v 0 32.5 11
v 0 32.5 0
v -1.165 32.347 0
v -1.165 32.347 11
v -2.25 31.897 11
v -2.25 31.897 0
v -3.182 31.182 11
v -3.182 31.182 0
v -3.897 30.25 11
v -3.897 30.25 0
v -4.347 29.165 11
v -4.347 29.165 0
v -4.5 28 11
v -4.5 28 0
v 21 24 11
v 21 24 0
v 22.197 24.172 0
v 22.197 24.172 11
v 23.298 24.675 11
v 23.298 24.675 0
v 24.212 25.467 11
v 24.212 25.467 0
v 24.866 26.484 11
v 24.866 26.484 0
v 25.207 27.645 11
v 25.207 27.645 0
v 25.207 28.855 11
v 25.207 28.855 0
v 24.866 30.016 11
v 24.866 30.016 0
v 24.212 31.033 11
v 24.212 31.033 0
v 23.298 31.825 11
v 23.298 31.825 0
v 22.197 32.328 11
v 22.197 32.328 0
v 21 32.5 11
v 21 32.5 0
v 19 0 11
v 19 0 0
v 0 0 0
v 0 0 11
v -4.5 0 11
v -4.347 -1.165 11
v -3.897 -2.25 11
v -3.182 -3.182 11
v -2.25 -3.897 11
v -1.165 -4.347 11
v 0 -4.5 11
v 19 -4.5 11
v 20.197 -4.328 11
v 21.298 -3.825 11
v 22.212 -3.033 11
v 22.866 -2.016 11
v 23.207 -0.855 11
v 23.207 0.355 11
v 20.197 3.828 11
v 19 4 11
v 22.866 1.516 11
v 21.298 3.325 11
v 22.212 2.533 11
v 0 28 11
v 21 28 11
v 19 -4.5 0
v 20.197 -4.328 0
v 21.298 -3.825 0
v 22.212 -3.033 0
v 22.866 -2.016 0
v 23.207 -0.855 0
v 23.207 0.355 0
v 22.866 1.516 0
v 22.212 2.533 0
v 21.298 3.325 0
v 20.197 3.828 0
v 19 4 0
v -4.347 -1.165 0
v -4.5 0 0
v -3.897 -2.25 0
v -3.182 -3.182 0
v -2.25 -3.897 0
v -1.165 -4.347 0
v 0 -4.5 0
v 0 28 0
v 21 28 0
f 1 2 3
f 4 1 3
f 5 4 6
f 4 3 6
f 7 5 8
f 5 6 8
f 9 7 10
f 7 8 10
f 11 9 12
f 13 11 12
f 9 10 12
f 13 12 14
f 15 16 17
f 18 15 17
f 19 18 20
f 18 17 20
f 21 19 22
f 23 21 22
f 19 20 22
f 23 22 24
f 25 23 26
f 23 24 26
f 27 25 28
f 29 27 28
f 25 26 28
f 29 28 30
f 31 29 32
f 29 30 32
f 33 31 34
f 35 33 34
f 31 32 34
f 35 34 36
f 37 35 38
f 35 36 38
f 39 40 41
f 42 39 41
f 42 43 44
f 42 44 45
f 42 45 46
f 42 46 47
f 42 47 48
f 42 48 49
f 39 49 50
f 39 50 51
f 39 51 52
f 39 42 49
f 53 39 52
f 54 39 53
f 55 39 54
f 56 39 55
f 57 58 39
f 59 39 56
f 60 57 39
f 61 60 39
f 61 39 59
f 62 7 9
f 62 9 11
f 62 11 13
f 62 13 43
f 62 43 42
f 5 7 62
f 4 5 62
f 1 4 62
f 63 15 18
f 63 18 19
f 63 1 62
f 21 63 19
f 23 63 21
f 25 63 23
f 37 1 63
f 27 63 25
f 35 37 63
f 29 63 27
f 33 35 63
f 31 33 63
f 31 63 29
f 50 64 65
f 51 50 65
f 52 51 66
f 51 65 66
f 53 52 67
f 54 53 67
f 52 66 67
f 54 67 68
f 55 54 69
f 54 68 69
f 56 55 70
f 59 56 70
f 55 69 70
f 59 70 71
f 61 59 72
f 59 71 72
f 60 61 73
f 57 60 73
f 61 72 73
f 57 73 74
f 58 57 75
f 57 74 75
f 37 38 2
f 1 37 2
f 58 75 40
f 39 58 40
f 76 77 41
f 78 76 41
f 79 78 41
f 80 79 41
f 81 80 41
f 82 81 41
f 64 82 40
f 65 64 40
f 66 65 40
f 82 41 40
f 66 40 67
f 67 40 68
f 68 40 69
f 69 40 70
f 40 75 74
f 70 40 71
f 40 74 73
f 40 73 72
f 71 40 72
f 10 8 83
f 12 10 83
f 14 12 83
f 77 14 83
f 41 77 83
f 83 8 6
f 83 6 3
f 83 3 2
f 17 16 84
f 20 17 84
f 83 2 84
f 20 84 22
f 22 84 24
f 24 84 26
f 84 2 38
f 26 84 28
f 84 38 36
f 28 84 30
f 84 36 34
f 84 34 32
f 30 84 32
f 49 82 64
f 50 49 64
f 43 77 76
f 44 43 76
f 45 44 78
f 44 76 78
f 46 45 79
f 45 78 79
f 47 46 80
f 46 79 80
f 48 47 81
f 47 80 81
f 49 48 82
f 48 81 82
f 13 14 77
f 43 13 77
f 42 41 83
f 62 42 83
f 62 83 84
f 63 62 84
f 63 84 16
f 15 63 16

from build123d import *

# Parameters (mm, degrees)
F1_DEPTH = 11


with BuildPart() as f1:
    # F0 (on Top) → F1 (new body)
    with BuildSketch(Plane.XY):
        with BuildLine():
            Line((19, 0), (0, 0))
            Line((0, 0), (0, 28))
            Line((0, 28), (21, 28))
            Line((21, 28), (21, 24))
            ThreePointArc((21, 24), (25.25, 28.25), (21, 32.5))
            Line((21, 32.5), (0, 32.5))
            ThreePointArc((0, 32.5), (-3.181981, 31.181981), (-4.5, 28))
            Line((-4.5, 28), (-4.5, 0))
            ThreePointArc((-4.5, 0), (-3.181981, -3.181981), (0, -4.5))
            Line((0, -4.5), (19, -4.5))
            ThreePointArc((19, -4.5), (23.25, -0.25), (19, 4))
            Line((19, 4), (19, 0))
        make_face()
    extrude(amount=F1_DEPTH)


solid = f1.part
